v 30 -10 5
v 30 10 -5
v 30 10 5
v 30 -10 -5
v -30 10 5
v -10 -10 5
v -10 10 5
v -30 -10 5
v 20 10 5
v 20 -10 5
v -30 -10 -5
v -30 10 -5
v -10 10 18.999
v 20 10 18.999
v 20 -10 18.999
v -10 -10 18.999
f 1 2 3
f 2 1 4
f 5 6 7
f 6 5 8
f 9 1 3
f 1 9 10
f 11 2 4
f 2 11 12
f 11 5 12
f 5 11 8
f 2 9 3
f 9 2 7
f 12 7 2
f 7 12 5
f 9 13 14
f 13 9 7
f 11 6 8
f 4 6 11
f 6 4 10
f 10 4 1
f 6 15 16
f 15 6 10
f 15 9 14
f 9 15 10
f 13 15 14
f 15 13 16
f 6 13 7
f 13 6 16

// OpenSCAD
module body(base_height=10, top_height=14, base_length=60, top_length=30, width=20, top_offset=5) {
    // Car body base
    cube([base_length, width, base_height], center=true);
    // Car body top
    translate([top_offset, 0, base_height/2+top_height/2-0.001])
        cube([top_length, width, top_height], center=true);
    }

body();
